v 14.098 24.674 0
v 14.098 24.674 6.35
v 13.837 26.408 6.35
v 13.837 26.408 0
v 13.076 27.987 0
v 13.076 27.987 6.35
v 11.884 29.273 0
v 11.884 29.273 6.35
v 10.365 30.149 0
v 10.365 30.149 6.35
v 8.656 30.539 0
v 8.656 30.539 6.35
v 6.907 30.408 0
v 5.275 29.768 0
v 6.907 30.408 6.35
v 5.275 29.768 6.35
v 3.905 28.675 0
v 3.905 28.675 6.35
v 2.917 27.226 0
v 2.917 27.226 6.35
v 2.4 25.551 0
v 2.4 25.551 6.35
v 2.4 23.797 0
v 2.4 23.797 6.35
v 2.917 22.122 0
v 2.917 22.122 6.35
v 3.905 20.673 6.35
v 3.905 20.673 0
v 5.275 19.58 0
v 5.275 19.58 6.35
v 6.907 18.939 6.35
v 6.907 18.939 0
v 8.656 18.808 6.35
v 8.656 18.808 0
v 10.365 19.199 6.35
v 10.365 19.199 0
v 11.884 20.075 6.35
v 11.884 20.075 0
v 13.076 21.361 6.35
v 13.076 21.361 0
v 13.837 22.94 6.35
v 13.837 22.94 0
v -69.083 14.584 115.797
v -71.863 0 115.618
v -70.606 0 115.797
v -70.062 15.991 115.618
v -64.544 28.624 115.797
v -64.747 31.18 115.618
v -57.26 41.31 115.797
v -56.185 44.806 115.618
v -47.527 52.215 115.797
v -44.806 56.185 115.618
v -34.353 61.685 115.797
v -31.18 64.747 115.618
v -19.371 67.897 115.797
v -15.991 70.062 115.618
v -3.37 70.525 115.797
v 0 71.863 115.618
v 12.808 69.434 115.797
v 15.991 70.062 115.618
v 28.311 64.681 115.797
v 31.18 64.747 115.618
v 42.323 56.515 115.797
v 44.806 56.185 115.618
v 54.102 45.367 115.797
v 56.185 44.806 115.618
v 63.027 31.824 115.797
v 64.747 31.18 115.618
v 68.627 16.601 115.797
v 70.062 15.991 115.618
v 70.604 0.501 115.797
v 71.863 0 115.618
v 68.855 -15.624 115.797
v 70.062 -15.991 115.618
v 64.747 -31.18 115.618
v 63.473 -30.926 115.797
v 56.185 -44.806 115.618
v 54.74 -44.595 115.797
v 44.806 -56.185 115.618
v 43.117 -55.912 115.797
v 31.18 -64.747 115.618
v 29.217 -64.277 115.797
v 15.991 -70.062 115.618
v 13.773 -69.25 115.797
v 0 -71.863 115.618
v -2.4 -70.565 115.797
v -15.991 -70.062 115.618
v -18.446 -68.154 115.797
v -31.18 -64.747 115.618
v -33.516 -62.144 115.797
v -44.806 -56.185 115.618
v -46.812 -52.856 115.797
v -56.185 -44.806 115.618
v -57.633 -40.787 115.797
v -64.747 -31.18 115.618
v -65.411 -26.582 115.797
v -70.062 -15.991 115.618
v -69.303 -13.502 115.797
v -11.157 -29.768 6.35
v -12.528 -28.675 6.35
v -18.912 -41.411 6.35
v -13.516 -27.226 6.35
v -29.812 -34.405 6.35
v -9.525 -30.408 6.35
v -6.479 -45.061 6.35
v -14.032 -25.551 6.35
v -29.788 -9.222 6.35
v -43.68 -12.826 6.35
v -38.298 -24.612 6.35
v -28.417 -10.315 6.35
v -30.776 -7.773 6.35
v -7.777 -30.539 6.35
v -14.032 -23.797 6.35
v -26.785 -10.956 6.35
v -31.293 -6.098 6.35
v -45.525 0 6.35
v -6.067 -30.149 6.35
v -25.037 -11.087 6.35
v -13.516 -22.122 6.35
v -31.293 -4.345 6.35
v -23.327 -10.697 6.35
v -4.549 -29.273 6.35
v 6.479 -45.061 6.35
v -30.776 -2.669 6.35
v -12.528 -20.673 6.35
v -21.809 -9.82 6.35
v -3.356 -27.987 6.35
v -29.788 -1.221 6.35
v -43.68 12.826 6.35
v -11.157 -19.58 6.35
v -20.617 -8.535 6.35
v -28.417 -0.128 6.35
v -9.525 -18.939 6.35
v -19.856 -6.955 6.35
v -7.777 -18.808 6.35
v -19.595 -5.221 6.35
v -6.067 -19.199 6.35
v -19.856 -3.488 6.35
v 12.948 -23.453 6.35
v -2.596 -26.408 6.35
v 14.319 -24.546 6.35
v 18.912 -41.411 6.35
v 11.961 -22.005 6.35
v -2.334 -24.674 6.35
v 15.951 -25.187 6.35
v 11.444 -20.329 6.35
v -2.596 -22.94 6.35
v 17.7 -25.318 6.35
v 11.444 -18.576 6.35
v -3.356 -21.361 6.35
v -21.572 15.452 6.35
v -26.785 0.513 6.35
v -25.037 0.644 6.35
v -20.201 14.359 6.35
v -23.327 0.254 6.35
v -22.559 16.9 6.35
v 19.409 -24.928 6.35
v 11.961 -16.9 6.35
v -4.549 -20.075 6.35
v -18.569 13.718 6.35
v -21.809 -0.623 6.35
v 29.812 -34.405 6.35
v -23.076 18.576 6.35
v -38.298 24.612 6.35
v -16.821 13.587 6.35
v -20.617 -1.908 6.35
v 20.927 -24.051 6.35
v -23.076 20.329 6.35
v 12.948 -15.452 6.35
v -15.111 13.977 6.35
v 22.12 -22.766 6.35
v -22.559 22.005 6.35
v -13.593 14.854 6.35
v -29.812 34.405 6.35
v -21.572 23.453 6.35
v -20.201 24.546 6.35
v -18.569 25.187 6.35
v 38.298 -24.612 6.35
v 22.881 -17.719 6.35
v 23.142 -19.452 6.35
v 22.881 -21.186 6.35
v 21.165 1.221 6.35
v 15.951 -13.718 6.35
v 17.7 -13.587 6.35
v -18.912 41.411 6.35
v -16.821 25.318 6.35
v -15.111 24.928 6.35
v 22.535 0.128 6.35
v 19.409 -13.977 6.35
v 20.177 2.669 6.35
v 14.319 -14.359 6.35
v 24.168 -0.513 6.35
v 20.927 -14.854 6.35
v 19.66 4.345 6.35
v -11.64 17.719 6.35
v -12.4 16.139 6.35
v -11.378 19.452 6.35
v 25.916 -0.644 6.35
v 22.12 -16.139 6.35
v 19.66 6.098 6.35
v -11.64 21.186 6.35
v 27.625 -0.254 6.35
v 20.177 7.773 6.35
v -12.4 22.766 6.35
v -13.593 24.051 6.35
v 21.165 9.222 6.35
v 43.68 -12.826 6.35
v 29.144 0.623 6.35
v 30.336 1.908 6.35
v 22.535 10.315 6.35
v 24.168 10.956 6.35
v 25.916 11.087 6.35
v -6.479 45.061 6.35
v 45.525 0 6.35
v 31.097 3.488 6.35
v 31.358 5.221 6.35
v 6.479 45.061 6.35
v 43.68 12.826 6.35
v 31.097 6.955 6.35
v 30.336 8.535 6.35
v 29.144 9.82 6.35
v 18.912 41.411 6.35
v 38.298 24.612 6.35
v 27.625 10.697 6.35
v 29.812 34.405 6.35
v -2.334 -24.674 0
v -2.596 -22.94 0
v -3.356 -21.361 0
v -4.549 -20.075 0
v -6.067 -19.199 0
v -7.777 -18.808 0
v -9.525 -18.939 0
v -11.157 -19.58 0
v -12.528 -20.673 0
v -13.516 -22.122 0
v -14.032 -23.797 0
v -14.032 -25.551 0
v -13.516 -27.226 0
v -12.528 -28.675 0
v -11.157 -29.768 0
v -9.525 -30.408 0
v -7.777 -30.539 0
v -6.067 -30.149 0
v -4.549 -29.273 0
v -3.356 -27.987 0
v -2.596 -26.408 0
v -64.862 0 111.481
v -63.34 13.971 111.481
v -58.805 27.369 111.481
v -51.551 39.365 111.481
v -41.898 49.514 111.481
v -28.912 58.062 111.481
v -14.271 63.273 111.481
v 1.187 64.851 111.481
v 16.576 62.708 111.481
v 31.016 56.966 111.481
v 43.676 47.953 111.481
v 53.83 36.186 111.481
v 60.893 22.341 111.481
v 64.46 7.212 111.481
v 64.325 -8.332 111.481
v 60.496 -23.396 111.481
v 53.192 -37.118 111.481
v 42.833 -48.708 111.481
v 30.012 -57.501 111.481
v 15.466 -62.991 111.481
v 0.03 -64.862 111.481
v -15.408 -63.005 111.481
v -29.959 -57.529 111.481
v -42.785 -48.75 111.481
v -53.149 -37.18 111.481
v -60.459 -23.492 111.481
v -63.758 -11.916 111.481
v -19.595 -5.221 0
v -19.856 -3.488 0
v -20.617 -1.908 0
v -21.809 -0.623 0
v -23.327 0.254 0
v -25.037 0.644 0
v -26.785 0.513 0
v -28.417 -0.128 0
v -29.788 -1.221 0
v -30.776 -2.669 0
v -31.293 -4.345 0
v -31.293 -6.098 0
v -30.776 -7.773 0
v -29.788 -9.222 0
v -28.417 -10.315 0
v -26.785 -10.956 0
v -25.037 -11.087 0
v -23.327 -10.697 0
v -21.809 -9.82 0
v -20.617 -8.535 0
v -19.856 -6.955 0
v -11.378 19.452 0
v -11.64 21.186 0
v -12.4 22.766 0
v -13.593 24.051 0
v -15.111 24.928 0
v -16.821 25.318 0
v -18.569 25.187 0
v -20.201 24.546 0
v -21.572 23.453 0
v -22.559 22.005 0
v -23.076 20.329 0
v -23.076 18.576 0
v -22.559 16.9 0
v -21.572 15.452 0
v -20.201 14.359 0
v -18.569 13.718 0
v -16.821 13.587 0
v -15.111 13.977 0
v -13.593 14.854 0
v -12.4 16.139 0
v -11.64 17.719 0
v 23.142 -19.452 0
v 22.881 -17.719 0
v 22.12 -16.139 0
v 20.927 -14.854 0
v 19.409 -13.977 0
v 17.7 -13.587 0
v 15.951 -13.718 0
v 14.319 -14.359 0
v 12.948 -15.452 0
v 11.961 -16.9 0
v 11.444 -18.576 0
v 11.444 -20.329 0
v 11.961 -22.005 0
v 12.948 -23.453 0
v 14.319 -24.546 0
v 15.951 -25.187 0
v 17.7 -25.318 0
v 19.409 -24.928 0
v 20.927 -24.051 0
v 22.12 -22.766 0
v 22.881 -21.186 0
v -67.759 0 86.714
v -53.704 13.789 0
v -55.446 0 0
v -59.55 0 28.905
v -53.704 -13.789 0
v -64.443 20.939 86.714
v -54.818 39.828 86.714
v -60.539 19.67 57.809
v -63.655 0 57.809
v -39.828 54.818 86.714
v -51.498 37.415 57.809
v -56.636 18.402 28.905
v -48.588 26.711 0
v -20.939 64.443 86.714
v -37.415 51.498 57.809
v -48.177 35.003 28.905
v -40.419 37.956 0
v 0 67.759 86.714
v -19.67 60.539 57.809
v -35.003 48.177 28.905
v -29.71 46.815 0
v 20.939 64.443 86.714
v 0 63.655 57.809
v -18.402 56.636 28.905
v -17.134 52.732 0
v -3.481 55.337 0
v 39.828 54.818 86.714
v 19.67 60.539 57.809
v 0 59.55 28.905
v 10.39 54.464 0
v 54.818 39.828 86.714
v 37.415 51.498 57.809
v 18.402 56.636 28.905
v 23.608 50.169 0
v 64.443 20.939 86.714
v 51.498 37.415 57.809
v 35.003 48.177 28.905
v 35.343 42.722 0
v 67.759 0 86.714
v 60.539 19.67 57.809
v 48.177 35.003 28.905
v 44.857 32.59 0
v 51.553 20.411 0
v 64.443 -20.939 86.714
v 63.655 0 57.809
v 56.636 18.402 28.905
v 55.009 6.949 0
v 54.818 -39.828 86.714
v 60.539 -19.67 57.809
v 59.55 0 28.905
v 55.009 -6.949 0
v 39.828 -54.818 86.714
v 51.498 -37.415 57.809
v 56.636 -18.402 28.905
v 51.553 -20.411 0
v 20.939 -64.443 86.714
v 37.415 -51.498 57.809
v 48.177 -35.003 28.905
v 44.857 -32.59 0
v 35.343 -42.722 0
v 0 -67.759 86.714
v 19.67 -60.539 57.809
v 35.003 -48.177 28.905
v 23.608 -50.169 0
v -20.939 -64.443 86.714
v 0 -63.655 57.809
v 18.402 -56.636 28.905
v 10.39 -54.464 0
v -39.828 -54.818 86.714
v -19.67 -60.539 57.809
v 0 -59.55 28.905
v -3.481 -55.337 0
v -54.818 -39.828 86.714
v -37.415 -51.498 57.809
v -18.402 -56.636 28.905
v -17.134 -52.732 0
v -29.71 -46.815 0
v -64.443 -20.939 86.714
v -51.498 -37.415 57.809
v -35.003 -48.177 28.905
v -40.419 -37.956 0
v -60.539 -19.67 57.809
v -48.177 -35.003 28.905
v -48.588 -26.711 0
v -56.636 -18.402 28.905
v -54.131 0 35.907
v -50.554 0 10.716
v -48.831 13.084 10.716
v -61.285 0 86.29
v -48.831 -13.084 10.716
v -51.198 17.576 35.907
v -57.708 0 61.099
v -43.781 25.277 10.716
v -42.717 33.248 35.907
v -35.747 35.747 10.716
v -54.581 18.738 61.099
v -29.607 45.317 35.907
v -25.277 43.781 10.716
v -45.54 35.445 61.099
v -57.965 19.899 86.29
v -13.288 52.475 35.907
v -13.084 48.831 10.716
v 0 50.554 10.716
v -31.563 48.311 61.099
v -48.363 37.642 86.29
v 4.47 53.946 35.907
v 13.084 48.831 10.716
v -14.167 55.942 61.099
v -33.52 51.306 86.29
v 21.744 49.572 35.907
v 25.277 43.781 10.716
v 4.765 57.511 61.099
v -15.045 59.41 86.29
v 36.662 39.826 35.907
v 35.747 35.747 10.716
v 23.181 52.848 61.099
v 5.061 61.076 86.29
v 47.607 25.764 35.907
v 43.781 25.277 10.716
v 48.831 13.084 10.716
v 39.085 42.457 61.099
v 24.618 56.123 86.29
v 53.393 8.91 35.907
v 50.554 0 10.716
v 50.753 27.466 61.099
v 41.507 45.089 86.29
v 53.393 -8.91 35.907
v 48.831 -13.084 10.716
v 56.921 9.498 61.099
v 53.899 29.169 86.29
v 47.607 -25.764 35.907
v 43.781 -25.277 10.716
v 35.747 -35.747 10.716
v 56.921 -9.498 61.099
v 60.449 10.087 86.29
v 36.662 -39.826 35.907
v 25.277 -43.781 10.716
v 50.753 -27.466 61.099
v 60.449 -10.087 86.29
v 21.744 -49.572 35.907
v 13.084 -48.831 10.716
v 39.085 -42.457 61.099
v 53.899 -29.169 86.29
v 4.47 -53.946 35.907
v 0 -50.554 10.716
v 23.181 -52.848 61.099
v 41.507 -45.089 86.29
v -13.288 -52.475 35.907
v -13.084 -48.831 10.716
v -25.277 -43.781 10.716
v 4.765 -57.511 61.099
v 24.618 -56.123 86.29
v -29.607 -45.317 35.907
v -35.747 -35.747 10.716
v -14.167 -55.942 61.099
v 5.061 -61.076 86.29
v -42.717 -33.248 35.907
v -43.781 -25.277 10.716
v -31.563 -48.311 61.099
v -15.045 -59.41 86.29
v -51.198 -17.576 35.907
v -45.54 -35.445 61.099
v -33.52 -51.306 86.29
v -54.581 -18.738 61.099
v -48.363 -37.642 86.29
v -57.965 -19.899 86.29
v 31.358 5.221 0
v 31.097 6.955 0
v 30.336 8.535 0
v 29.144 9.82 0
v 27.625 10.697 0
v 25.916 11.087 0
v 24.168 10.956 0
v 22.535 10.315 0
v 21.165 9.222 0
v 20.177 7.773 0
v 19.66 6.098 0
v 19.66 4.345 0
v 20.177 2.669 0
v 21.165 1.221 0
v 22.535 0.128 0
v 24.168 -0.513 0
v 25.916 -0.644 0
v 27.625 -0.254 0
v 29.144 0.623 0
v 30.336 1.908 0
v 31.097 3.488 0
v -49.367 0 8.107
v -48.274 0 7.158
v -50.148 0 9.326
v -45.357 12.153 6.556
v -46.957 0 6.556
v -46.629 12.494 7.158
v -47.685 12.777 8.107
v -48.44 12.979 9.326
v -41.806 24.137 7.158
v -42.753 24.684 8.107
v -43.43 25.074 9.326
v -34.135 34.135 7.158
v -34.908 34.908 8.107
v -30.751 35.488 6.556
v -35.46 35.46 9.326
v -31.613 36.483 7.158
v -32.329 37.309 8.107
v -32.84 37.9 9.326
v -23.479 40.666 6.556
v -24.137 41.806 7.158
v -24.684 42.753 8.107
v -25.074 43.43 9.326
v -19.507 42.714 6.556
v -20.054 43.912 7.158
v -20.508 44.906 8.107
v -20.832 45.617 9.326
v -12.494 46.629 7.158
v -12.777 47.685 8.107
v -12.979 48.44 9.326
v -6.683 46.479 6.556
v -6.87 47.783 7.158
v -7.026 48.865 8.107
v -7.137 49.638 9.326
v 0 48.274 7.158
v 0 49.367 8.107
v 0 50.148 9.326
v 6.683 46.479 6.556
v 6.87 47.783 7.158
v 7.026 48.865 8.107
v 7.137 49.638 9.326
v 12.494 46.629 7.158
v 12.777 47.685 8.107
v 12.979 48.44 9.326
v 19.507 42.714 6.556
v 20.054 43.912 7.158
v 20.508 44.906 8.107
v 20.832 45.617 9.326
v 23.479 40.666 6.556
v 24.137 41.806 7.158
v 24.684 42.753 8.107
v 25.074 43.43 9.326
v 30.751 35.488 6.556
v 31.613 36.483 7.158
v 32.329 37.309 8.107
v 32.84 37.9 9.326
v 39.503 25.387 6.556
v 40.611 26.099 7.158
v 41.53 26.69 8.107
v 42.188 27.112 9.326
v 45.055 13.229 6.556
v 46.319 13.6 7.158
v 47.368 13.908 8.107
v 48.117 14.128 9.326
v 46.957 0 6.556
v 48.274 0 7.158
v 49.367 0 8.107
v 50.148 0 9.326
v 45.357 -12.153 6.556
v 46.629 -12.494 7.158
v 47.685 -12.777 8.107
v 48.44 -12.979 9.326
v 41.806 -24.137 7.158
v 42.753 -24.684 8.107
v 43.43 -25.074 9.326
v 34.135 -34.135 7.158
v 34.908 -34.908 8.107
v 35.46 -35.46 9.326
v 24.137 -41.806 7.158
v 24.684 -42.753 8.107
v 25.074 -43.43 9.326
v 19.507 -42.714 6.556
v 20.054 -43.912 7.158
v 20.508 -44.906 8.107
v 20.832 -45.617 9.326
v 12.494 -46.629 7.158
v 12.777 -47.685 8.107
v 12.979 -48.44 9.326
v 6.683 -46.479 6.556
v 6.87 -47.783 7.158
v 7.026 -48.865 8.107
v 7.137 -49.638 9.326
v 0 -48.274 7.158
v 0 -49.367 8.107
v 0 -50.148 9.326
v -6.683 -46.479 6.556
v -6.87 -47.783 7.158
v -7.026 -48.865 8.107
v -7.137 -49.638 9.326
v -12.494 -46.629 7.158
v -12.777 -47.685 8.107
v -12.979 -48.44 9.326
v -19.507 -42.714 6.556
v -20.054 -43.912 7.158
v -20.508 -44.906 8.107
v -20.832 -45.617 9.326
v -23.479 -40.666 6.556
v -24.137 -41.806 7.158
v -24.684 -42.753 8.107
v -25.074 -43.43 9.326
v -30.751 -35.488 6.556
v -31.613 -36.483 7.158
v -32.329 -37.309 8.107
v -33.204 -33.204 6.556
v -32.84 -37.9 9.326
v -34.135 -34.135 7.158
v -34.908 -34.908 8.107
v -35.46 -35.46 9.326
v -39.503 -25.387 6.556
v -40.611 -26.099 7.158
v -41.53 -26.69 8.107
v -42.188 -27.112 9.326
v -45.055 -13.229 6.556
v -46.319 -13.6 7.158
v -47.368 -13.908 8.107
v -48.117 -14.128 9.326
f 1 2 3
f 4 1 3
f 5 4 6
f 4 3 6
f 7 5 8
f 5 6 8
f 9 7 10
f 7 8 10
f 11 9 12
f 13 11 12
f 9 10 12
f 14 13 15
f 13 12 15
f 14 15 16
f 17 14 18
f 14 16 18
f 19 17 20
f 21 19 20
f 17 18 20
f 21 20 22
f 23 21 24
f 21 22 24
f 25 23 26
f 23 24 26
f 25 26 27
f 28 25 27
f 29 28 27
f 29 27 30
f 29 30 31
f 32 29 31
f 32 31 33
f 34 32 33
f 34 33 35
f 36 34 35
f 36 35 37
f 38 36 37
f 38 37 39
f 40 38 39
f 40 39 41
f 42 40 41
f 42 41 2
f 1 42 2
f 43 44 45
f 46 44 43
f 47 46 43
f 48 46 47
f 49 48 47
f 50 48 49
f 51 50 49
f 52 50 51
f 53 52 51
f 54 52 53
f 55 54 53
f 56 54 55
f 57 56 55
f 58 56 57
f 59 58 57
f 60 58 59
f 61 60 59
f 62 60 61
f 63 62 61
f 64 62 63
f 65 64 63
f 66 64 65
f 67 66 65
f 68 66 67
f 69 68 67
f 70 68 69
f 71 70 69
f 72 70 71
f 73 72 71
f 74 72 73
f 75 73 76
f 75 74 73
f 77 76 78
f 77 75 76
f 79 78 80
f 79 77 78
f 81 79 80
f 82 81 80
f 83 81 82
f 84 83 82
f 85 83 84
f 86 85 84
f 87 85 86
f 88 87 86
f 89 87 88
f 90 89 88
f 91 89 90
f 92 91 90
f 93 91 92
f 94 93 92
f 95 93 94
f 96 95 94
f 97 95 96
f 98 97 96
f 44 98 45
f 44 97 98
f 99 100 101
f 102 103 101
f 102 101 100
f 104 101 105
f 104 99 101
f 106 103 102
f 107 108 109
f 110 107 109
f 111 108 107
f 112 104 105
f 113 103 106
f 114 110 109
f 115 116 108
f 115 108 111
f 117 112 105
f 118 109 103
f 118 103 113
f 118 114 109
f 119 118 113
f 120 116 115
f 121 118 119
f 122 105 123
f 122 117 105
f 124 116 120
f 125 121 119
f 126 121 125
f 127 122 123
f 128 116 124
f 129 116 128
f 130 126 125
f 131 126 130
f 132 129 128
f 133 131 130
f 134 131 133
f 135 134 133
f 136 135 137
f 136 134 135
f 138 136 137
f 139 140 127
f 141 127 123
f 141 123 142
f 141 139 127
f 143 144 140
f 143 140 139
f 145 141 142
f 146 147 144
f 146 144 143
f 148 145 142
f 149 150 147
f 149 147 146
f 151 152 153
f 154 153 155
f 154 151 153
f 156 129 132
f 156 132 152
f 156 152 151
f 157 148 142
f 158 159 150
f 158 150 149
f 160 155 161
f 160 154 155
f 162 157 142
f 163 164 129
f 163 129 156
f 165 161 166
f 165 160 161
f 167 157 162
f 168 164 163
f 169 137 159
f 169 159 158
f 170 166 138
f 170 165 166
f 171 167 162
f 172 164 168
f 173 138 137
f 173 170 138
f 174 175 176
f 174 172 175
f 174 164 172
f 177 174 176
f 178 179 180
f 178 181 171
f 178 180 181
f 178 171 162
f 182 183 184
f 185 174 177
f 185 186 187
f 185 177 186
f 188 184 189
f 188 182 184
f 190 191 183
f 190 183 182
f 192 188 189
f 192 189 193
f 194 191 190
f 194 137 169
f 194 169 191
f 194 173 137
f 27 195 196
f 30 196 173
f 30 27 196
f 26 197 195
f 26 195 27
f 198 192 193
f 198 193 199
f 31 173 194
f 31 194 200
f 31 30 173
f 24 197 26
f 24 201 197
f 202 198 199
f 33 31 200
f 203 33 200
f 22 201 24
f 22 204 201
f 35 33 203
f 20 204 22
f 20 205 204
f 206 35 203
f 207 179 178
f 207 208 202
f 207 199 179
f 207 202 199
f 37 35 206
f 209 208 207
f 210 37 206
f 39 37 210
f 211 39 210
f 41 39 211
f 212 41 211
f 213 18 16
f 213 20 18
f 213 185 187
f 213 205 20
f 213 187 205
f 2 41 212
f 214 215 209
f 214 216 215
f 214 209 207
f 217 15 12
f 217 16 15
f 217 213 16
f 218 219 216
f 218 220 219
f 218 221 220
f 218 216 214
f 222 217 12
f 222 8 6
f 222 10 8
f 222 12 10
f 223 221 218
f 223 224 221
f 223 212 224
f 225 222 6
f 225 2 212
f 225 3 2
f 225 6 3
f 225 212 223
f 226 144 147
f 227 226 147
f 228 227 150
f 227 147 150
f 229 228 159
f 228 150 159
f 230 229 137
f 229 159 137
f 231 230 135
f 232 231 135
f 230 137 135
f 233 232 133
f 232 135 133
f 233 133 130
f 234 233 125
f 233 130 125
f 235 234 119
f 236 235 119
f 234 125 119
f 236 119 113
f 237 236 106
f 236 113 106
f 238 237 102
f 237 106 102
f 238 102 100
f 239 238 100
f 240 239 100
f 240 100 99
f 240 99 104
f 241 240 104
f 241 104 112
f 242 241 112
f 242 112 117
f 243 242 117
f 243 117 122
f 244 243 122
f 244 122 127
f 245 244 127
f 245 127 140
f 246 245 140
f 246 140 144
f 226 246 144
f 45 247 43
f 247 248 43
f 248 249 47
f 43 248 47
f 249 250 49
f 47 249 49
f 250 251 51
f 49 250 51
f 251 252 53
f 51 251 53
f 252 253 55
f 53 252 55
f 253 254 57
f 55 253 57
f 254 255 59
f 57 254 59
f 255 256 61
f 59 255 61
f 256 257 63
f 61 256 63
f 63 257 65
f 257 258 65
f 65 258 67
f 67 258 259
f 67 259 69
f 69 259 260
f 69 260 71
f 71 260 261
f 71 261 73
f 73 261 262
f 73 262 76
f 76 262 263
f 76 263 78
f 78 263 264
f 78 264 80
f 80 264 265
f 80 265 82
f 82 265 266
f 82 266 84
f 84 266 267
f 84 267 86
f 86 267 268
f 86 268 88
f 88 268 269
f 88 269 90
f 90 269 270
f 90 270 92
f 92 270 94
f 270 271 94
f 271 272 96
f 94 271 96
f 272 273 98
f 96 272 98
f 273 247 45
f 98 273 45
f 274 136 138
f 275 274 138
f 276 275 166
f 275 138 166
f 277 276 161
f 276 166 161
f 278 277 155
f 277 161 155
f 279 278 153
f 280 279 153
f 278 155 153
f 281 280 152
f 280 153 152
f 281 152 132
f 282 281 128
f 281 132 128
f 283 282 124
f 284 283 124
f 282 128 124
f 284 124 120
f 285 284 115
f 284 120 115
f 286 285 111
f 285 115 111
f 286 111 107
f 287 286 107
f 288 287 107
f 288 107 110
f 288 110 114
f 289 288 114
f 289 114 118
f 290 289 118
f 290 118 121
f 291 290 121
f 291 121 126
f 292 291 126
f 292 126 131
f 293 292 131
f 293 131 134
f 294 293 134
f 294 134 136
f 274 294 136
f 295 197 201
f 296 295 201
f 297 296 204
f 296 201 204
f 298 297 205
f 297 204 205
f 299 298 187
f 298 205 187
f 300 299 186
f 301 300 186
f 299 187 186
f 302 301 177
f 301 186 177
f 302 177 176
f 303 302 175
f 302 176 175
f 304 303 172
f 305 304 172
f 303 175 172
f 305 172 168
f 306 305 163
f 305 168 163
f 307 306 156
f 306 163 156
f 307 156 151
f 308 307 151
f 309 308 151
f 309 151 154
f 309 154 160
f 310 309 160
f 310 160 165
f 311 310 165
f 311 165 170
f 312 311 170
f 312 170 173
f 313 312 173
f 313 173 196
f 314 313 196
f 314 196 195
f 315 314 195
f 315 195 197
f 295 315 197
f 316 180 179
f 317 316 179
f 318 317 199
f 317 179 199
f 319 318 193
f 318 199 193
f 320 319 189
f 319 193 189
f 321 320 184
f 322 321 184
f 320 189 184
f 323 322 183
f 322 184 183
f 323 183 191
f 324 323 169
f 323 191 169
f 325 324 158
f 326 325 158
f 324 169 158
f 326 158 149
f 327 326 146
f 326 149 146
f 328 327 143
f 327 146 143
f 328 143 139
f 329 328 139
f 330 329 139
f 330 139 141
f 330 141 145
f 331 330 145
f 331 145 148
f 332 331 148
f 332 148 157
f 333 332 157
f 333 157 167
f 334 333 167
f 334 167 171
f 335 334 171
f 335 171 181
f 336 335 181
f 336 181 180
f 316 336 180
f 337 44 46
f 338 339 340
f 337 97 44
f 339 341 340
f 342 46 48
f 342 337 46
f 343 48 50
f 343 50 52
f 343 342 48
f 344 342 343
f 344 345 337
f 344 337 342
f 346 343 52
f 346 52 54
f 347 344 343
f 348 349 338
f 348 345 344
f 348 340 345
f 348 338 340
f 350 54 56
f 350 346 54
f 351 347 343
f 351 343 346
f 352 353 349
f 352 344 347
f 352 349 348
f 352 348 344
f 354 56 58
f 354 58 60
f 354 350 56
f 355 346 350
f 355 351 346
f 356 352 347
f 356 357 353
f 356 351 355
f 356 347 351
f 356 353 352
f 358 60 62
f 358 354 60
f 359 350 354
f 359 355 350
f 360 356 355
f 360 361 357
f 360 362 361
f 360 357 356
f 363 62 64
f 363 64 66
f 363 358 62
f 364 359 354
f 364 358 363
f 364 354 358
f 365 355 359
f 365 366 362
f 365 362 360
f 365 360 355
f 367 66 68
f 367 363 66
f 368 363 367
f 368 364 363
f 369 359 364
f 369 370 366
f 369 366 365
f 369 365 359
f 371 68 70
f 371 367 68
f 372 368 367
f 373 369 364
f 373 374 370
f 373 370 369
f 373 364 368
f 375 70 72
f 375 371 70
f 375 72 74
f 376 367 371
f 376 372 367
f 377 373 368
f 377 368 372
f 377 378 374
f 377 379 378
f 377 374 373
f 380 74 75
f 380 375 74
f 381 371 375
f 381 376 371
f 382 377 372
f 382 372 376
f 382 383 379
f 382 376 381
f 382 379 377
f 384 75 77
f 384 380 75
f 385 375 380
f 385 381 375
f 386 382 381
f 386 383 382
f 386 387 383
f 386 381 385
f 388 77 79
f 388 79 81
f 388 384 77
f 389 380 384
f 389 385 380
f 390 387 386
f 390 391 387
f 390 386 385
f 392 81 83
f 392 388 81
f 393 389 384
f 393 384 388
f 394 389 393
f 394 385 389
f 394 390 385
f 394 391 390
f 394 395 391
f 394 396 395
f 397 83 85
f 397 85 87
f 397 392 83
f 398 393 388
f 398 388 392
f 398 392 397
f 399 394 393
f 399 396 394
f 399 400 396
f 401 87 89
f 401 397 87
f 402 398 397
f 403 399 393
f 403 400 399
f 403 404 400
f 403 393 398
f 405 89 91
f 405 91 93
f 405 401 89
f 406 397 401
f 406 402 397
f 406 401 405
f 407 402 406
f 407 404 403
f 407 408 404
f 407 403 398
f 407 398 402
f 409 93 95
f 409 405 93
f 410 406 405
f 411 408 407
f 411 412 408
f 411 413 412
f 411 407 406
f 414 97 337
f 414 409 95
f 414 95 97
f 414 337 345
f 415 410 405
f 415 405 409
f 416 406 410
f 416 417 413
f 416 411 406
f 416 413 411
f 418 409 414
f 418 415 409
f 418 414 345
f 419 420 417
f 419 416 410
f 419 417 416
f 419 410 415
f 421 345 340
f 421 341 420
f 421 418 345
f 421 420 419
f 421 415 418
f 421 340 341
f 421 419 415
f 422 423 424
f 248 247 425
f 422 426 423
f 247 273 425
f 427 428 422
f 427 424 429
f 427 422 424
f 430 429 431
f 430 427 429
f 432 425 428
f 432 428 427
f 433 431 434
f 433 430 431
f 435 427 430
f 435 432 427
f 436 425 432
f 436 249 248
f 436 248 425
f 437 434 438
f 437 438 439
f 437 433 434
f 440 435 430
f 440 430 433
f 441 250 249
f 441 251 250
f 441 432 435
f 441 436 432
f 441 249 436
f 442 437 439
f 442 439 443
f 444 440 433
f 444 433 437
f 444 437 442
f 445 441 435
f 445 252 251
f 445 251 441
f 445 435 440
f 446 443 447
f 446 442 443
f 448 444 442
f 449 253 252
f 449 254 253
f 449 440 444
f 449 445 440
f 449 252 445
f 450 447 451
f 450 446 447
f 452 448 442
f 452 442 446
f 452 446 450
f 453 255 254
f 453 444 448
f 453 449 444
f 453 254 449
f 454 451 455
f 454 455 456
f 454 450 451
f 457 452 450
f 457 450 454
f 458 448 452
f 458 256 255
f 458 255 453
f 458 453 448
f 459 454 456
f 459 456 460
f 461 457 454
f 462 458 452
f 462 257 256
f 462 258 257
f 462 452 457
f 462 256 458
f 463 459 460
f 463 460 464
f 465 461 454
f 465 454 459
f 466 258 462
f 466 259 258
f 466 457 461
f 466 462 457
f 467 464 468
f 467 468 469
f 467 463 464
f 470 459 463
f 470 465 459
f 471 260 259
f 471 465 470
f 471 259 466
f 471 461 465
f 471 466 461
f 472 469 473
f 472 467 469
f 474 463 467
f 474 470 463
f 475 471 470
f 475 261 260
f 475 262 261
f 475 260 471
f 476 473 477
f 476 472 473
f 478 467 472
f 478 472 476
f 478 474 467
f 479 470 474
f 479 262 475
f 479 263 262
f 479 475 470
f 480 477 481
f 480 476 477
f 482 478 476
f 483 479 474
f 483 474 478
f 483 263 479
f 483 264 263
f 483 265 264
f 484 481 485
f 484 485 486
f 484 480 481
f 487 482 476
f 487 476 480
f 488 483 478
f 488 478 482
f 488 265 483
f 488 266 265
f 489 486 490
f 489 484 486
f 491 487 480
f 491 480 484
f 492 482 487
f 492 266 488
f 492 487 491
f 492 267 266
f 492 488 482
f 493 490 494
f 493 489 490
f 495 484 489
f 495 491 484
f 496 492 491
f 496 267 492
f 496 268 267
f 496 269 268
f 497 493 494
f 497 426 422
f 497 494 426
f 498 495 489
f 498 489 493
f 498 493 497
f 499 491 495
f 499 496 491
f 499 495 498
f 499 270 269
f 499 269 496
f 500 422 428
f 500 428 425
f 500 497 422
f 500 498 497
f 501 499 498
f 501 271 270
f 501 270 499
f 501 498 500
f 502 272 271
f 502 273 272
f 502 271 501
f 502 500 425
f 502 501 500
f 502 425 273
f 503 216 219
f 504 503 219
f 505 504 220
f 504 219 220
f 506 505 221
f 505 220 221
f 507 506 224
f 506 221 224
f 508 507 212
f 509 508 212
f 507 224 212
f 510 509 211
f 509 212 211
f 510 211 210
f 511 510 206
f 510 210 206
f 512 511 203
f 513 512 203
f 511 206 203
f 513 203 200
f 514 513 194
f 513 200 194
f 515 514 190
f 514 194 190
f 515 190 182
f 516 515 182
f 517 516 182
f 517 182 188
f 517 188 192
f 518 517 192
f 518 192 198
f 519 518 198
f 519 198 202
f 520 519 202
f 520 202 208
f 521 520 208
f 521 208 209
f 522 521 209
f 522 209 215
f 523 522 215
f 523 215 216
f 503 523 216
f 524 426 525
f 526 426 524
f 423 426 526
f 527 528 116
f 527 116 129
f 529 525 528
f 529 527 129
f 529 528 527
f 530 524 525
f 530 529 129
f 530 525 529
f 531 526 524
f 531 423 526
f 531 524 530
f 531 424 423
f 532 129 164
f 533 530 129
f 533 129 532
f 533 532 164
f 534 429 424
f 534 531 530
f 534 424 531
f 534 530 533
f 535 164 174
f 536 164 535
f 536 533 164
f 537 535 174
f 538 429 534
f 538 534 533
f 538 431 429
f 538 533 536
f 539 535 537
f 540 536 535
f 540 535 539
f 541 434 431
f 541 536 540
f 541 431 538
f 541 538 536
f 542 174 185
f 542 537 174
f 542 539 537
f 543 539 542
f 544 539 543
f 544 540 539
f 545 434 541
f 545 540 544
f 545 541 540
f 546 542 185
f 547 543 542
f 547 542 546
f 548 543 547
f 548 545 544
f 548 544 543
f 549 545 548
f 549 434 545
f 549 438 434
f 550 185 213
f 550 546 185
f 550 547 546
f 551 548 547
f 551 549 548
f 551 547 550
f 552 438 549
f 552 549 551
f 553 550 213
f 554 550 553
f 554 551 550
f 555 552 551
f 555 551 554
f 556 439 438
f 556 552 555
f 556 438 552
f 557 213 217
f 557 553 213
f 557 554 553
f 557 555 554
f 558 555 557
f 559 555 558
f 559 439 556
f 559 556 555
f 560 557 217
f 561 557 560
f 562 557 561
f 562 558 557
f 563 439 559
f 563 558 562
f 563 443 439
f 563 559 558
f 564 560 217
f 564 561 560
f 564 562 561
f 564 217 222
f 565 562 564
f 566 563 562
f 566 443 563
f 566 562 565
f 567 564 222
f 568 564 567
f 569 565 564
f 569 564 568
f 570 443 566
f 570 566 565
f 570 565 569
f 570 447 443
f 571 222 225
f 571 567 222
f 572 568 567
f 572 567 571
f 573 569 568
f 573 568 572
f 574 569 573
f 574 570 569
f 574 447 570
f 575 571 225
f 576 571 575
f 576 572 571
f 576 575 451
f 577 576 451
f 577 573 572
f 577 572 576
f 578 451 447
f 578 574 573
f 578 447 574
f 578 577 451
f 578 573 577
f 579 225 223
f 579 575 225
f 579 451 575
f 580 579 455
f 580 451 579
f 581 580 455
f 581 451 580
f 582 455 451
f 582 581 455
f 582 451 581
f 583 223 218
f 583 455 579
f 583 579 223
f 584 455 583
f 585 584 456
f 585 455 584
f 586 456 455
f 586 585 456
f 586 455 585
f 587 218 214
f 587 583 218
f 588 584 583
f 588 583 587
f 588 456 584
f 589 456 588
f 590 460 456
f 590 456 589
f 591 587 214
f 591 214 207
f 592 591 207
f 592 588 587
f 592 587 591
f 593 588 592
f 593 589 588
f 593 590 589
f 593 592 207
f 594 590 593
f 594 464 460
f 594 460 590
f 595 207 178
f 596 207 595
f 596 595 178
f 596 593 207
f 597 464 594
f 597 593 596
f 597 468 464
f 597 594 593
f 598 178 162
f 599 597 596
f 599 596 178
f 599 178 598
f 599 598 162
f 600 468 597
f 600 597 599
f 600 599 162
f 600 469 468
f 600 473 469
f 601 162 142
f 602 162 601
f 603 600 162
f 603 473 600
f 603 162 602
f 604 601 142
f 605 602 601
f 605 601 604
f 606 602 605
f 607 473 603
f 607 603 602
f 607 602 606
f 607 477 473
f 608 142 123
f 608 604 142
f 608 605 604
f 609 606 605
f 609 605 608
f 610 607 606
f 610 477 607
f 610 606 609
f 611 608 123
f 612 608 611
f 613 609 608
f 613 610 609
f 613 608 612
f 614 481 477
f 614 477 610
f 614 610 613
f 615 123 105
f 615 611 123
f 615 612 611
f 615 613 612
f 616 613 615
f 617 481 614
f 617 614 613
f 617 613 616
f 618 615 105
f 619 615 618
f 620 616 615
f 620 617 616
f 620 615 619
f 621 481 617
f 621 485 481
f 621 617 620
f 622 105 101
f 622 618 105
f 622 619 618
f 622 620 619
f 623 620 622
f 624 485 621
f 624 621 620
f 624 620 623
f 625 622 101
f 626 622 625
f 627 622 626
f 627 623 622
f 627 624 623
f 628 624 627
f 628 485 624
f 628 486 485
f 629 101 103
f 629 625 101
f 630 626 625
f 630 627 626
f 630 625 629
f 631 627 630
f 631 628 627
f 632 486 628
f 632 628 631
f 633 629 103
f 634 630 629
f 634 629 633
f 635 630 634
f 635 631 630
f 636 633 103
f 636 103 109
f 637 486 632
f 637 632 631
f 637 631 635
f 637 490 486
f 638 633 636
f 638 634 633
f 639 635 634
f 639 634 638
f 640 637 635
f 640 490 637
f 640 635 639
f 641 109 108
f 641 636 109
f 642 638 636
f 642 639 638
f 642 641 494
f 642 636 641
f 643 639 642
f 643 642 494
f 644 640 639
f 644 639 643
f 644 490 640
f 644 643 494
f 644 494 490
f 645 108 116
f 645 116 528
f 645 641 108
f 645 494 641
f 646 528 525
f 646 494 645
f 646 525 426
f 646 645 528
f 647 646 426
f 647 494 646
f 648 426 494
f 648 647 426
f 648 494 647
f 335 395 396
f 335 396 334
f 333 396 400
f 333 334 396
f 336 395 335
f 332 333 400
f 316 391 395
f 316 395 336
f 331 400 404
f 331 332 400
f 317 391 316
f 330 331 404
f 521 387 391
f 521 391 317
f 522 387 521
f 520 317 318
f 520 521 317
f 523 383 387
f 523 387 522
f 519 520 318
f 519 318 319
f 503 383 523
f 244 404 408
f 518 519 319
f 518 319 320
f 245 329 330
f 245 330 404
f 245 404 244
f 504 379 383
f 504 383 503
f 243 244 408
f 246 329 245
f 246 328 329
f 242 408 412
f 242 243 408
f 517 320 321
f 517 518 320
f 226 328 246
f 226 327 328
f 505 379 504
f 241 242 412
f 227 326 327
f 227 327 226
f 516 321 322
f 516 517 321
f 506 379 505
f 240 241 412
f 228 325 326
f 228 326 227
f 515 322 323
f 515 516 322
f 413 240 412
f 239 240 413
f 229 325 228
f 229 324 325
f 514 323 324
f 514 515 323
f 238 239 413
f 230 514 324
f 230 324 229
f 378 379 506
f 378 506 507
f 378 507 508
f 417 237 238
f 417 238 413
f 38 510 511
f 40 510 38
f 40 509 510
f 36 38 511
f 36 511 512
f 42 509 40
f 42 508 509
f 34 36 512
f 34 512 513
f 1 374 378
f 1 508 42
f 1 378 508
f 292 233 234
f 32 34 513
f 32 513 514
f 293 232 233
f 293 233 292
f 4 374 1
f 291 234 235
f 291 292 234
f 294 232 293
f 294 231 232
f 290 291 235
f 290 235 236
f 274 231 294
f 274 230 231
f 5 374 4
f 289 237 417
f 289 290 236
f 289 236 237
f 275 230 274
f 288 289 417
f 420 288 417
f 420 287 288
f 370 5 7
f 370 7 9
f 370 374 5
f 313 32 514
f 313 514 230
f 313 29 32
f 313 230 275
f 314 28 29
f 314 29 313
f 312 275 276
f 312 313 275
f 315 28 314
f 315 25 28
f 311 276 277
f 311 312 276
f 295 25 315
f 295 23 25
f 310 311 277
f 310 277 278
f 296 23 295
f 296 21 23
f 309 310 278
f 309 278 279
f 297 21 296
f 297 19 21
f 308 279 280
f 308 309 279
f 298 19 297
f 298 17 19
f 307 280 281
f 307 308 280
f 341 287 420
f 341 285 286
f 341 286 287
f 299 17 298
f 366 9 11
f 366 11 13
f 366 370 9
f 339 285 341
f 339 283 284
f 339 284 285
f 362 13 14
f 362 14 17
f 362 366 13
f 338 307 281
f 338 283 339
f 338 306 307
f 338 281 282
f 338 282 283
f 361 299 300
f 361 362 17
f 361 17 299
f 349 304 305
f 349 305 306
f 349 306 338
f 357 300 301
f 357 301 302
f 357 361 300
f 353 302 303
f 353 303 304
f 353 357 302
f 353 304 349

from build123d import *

# Parameters (mm, degrees)
F2_R     = 5.08
F3_SIZE  = 5.08
F4_R     = 5.881856
F5_DEPTH = 6.351


with BuildPart() as f1:
    # F0 (on Front) → F1 (revolve)
    with BuildSketch(Plane.XZ):
        Polygon((-55.446185, 0), (0, 0), (0, 6.35), (-49.934152, 6.35), (-65.576335, 116.510788), (-71.863271, 115.61808), align=None)
    revolve(axis=Axis((0, 0, 3.175), (0, 0, -1)))

    # F2
    f2_edges = [f1.edges().sort_by_distance(p)[0] for p in [
        (49.934152, 0, 6.35),
    ]]
    fillet(f2_edges, radius=F2_R)

    # F3
    f3_edges = [f1.edges().sort_by_distance(p)[0] for p in [
        (65.576335, 0, 116.510788),
    ]]
    chamfer(f3_edges, length=F3_SIZE)

    # F4 (on face) → F5 (cut, through all)
    with BuildSketch(Plane.XY.offset(6.35)):
        with Locations((-17.260052, 19.45248)):
            Circle(F4_R)
        with Locations((-25.476368, -5.221403)):
            Circle(F4_R)
        with Locations((-8.216316, -24.673883)):
            Circle(F4_R)
        with Locations((17.260052, -19.45248)):
            Circle(F4_R)
        with Locations((25.476368, 5.221403)):
            Circle(F4_R)
        with Locations((8.216316, 24.673883)):
            Circle(F4_R)
    extrude(amount=-F5_DEPTH, mode=Mode.SUBTRACT)


solid = f1.part
